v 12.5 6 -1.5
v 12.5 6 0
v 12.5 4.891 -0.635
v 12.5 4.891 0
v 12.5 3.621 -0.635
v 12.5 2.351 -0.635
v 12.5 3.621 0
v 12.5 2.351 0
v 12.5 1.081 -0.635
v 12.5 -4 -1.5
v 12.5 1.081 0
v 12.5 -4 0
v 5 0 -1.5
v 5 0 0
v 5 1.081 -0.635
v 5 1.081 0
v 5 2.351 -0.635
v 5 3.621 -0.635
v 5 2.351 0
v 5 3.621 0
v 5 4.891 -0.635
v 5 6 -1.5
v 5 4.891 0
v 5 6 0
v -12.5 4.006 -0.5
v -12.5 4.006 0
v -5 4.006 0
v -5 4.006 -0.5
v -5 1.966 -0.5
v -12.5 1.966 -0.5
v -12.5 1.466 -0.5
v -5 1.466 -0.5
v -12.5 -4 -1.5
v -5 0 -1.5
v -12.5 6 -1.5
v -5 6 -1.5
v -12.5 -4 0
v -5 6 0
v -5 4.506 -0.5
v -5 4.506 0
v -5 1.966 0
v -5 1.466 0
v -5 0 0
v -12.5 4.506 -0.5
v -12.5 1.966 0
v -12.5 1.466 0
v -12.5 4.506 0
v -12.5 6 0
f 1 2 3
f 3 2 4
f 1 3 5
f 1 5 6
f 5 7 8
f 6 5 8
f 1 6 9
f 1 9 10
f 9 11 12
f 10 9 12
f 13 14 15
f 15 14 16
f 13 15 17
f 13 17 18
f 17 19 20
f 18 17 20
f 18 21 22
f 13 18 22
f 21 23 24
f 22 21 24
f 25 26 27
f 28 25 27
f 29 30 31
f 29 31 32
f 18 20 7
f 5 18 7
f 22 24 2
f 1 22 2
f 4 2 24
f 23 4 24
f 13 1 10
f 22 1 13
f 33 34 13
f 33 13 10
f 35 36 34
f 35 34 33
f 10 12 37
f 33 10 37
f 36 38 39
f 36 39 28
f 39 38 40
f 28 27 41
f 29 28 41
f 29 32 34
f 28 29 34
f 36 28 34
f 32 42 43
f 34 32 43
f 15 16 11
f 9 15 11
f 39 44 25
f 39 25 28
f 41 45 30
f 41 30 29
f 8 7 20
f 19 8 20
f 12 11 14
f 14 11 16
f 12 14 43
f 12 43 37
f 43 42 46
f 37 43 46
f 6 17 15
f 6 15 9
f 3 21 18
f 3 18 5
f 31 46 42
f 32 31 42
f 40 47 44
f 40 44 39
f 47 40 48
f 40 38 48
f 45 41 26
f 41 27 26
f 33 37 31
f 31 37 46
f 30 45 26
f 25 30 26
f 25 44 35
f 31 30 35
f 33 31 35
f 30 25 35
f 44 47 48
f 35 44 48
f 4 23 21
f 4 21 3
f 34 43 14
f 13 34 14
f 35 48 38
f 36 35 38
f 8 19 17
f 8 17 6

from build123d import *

# Parameters (mm, degrees)
PAD_DEPTH       = 1.5
SKETCH002_W     = 9.788774
SKETCH002_H     = 1.27
POCKET001_DEPTH = 0.635
SKETCH001_W     = 9.785776
SKETCH001_H     = 0.5
POCKET_DEPTH    = 0.5


with BuildPart() as part:
    # Sketch → Pad (new body)
    with BuildSketch(Plane.XY):
        Polygon((-12.5, 6), (-5, 6), (-5, 0), (5, 0), (5, 6), (12.5, 6), (12.5, -4), (-12.5, -4), align=None)
    extrude(amount=-PAD_DEPTH)

    # Sketch002 → Pocket001 (cut)
    with BuildSketch(Plane.XY):
        with Locations((8.541229, 4.25644)):
            Rectangle(SKETCH002_W, SKETCH002_H)
        with Locations((8.541229, 1.71644)):
            Rectangle(SKETCH002_W, SKETCH002_H)
    extrude(amount=-POCKET001_DEPTH, mode=Mode.SUBTRACT)

    # Sketch001 → Pocket (cut)
    with BuildSketch(Plane.XY):
        with Locations((-8.271684, 4.25644)):
            Rectangle(SKETCH001_W, SKETCH001_H)
        with Locations((-8.271684, 1.71644)):
            Rectangle(SKETCH001_W, SKETCH001_H)
    extrude(amount=-POCKET_DEPTH, mode=Mode.SUBTRACT)


solid = part.part
